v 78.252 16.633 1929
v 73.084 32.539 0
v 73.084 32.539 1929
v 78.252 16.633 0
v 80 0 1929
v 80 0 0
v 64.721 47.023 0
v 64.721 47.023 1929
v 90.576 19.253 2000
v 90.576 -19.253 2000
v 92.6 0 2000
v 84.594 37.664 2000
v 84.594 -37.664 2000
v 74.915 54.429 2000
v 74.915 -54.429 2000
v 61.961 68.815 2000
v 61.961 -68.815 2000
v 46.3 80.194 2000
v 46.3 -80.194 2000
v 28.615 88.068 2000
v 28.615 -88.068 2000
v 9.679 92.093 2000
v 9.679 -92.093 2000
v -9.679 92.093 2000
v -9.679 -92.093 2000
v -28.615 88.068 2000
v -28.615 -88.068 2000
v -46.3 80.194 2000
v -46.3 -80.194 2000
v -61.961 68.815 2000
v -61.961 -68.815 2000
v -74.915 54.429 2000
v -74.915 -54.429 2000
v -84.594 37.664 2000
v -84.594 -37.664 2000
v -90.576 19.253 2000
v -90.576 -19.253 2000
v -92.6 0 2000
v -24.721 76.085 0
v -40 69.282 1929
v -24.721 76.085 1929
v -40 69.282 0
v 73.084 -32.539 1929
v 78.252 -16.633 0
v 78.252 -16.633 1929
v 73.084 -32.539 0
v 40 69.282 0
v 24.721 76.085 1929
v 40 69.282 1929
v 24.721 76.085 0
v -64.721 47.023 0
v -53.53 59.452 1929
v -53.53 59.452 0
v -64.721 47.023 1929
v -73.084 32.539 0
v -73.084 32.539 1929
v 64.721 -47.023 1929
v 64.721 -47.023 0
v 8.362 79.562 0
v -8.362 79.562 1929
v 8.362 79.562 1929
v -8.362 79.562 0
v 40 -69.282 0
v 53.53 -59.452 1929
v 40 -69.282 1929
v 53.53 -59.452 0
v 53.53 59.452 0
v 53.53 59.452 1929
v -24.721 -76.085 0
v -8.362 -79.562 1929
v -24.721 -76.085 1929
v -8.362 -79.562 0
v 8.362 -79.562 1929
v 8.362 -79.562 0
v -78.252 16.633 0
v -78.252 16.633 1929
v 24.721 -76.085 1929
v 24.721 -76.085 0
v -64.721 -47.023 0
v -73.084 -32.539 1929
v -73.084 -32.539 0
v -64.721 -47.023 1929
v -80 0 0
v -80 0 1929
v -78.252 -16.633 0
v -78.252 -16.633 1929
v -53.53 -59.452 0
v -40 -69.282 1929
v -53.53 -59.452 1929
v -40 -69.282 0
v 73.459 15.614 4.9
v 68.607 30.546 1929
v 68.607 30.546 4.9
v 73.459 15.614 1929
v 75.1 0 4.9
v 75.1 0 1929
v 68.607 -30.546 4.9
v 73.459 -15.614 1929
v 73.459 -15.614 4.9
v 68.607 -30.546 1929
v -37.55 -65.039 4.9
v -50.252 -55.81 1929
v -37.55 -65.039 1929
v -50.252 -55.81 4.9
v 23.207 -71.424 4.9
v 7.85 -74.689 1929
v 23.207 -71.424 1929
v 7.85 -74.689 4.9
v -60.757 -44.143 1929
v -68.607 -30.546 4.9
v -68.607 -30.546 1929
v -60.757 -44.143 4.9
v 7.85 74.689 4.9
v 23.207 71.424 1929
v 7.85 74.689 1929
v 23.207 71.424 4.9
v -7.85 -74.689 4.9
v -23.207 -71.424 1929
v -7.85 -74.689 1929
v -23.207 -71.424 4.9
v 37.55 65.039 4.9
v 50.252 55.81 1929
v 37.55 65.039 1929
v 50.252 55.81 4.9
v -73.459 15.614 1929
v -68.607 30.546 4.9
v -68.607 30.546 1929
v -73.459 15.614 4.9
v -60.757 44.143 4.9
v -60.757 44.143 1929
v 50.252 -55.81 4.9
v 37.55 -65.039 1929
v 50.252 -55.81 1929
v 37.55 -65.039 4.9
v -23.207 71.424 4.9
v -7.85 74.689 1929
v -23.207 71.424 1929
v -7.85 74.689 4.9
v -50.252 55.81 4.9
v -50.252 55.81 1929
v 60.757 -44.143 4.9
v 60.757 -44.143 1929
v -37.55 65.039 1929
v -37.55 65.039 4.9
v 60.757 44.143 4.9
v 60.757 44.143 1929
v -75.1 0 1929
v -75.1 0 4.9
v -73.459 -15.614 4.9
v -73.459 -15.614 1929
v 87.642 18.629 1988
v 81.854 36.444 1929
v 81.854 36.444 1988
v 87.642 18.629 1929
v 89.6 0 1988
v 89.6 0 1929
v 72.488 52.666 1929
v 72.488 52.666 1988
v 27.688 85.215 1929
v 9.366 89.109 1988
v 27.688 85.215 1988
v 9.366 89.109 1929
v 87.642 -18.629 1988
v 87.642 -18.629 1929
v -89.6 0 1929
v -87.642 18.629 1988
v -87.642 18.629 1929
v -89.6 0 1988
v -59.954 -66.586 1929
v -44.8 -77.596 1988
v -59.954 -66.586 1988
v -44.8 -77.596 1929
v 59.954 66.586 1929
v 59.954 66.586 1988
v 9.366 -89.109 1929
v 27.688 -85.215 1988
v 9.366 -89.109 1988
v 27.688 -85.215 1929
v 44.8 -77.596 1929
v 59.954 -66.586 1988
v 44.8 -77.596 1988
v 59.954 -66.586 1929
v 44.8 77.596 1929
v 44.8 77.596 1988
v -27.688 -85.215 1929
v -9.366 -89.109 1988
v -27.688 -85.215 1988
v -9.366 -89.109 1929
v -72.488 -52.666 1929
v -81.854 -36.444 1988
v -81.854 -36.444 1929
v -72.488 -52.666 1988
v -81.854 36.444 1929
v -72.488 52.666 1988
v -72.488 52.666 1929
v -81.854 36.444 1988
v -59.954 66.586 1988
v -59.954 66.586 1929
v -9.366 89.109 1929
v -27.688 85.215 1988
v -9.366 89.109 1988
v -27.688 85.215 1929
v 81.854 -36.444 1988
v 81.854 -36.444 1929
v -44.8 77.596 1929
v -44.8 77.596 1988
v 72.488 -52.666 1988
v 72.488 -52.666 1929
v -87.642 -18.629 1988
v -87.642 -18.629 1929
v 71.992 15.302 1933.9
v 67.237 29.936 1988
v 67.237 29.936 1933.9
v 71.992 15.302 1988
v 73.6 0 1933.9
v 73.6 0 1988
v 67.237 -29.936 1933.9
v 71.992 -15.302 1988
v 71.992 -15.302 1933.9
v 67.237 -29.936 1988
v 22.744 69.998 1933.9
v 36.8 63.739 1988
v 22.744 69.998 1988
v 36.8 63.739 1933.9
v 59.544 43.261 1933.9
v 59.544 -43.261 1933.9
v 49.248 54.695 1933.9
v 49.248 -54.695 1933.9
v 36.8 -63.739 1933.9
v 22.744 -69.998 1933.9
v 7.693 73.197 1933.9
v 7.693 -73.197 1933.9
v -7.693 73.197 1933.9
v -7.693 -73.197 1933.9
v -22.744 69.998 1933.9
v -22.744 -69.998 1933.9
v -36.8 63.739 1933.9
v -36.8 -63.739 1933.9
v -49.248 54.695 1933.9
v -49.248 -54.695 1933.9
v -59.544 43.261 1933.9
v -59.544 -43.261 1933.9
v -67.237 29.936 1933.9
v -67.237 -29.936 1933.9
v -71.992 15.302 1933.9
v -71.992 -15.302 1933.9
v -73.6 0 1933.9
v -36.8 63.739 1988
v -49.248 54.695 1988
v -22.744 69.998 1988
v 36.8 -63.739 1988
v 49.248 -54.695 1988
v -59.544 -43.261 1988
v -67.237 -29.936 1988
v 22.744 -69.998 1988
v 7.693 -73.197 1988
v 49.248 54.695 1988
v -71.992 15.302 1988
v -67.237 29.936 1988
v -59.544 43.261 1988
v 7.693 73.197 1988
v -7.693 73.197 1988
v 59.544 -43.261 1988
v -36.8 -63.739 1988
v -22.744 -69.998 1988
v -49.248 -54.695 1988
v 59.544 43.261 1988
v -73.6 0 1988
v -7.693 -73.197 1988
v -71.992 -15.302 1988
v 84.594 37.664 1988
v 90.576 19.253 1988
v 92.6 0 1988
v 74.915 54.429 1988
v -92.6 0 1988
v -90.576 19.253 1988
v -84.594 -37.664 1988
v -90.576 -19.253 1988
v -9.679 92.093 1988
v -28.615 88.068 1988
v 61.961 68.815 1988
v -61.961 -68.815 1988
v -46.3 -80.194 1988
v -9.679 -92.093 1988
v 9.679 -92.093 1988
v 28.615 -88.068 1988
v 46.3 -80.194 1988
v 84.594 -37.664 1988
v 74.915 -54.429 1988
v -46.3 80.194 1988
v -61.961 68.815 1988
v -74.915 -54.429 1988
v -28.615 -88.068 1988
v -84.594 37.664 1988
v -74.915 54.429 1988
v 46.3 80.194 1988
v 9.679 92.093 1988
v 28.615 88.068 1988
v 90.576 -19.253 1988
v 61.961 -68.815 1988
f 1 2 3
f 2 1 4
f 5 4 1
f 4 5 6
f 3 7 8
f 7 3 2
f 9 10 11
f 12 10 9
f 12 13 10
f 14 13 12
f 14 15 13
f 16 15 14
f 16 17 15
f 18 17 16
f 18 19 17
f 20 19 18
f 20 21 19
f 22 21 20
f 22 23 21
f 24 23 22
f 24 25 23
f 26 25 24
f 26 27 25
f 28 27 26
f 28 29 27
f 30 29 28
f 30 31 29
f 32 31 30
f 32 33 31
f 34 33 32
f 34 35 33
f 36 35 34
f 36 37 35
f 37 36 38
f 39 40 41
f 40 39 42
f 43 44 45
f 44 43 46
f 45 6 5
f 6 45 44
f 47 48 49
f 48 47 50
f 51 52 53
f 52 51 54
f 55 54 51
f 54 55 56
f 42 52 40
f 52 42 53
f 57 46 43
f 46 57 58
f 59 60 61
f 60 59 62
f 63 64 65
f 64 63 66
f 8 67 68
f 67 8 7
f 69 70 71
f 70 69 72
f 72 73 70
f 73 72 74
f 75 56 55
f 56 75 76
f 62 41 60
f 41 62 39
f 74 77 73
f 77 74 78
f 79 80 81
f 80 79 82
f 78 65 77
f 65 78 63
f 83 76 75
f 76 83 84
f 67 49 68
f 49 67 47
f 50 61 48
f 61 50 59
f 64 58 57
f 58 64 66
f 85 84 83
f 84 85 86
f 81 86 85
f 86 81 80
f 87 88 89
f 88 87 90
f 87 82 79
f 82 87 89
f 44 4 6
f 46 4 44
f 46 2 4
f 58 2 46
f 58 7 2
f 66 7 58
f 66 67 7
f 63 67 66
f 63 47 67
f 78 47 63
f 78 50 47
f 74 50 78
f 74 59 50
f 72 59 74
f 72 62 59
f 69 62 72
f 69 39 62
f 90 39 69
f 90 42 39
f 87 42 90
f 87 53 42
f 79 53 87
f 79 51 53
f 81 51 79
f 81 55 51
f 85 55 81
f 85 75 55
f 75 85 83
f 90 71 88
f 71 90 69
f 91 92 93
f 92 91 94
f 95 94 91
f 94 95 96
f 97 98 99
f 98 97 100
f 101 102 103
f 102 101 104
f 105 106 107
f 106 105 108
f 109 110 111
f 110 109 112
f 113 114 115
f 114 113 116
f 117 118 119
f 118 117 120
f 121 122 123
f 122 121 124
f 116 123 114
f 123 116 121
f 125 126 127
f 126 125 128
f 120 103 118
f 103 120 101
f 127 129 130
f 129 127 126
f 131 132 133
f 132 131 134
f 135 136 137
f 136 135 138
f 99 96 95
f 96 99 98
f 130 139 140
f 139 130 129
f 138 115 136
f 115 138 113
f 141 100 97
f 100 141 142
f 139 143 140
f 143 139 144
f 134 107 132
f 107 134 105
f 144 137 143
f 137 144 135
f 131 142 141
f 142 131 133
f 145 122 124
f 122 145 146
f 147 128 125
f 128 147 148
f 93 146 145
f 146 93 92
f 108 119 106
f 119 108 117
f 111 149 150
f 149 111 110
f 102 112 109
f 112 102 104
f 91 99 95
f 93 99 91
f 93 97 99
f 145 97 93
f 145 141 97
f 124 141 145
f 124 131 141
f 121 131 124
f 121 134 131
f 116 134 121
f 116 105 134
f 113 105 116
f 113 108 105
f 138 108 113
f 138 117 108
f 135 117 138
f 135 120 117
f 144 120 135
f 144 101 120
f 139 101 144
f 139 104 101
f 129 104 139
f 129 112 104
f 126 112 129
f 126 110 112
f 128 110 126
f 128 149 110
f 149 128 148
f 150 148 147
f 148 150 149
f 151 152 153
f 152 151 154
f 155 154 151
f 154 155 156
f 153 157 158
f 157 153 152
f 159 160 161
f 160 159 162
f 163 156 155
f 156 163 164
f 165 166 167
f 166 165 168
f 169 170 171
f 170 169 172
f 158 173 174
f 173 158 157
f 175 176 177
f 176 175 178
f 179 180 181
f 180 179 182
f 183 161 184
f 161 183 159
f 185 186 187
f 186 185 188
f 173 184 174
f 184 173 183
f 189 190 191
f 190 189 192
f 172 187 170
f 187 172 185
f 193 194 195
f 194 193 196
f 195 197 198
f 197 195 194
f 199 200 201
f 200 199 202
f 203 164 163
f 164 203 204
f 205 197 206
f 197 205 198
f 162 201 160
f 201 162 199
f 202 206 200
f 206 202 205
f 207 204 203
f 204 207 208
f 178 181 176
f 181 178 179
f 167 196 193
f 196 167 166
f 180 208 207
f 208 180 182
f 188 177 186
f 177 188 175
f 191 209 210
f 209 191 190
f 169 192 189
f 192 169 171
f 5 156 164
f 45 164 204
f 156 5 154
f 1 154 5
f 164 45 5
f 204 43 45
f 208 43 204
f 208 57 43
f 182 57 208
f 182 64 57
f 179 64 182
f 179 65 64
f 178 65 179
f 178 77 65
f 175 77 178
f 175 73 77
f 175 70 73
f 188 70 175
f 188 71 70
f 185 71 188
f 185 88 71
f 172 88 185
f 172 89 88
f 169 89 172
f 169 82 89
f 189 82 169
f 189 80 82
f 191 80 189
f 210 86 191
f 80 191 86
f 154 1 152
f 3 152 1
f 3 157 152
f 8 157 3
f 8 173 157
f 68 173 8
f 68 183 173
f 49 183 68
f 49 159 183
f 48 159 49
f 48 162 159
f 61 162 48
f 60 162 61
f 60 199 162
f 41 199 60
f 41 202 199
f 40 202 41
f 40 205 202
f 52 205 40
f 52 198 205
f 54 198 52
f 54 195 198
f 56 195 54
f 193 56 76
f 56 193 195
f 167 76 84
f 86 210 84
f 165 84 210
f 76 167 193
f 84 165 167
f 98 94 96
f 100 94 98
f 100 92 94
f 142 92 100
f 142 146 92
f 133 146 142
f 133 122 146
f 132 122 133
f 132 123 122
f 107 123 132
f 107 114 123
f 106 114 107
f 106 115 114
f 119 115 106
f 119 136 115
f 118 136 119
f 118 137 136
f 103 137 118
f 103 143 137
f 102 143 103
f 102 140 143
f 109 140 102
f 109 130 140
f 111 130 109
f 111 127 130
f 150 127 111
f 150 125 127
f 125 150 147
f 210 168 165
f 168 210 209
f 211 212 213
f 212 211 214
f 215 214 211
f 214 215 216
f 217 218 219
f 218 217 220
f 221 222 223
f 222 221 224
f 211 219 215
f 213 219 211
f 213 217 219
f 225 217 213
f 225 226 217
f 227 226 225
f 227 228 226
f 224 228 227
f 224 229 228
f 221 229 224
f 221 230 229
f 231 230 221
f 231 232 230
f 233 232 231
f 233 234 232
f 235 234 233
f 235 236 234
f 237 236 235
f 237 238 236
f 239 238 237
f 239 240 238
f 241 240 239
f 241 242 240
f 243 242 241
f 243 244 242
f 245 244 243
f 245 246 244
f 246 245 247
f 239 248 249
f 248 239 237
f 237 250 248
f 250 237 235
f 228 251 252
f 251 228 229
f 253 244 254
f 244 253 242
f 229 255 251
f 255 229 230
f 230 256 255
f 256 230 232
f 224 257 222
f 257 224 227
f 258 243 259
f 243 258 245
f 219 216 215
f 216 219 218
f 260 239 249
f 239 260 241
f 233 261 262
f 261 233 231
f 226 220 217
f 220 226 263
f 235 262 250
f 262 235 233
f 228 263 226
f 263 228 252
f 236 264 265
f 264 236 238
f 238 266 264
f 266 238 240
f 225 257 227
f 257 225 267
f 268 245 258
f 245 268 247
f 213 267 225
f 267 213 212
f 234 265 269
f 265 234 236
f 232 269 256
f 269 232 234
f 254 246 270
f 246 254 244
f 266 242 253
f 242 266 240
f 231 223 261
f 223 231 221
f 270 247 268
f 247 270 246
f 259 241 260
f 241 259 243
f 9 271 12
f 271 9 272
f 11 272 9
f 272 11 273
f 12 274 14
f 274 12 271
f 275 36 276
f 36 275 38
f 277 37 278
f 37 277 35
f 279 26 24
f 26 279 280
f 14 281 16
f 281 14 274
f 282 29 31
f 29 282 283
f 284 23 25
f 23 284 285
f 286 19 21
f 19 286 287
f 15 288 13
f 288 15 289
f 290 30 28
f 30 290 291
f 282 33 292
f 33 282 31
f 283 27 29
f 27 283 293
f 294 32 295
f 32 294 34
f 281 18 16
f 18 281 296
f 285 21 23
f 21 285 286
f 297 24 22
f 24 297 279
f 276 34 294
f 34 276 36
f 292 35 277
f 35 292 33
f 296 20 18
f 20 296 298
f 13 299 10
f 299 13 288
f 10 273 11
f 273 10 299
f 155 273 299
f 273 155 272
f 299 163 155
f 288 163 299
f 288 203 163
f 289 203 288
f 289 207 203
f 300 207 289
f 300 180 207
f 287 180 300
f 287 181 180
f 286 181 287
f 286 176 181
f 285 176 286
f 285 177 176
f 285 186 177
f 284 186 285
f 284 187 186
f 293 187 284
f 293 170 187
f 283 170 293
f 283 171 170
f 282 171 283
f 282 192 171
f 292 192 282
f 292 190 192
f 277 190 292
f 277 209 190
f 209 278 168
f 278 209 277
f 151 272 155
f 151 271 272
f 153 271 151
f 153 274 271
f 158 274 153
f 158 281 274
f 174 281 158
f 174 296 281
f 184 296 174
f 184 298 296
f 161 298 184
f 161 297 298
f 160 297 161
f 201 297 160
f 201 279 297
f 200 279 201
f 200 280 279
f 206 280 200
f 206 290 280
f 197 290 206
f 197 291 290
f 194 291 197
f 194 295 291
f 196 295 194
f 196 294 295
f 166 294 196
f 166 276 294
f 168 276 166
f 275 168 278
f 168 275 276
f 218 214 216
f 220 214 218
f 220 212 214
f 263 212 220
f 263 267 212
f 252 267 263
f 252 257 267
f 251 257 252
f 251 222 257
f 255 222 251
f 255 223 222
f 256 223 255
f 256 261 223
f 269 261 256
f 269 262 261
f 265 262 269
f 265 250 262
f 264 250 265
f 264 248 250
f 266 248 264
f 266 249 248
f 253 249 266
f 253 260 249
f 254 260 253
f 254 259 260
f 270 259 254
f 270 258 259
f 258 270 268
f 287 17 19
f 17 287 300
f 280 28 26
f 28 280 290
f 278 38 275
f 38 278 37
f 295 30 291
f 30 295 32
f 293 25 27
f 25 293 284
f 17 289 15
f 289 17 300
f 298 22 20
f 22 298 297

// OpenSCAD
// Parameters
nominal_diameter_mm = 160; //[80:320:1]
length_mm = 2000; //[1000:4000:10]
od_mm = 160; //[80:320:1]
wall_thickness_mm = 4.9; //[2.5:10:0.1]
overlap_mm = 1; //[0.5:2:0.1]
include_end_fitting = 1; //[0:1:1]
fitting_length_mm = 70; //[35:140:1]
fitting_od_factor = 1.12; //[1.05:1.3:0.01]
fitting_wall_extra_mm = 1.5; //[0.5:4:0.1]
fitting_bead_length_mm = 12; //[6:30:1]
fitting_bead_od_extra_mm = 6; //[2:15:0.5]

// Ht Pipe - complete geometry
module ht_pipe() {
  color([0.85, 0.85, 0.8]) {
    // Main pipe body
    difference() {
      cylinder(h=length_mm, r=od_mm/2, center=false);
      translate([0, 0, wall_thickness_mm])
        cylinder(h=length_mm, r=od_mm/2 - wall_thickness_mm, center=false);
    }
    
    // End fitting detail
    if (include_end_fitting) {
      difference() {
        // Outer fitting
        translate([0, 0, length_mm - fitting_length_mm - overlap_mm])
          cylinder(h=fitting_length_mm, r=(od_mm*fitting_od_factor)/2, center=false);
        // Inner void of fitting
        translate([0, 0, length_mm - fitting_length_mm - overlap_mm + wall_thickness_mm])
          cylinder(h=fitting_length_mm, r=(od_mm/2 - wall_thickness_mm) - fitting_wall_extra_mm, center=false);
      }
      
      // Bead on fitting
      translate([0, 0, length_mm - fitting_bead_length_mm])
        cylinder(h=fitting_bead_length_mm, r=((od_mm*fitting_od_factor) + fitting_bead_od_extra_mm)/2, center=false);
    }
  }
}

// Assembly
module assembly() {
  ht_pipe();
}

assembly();
